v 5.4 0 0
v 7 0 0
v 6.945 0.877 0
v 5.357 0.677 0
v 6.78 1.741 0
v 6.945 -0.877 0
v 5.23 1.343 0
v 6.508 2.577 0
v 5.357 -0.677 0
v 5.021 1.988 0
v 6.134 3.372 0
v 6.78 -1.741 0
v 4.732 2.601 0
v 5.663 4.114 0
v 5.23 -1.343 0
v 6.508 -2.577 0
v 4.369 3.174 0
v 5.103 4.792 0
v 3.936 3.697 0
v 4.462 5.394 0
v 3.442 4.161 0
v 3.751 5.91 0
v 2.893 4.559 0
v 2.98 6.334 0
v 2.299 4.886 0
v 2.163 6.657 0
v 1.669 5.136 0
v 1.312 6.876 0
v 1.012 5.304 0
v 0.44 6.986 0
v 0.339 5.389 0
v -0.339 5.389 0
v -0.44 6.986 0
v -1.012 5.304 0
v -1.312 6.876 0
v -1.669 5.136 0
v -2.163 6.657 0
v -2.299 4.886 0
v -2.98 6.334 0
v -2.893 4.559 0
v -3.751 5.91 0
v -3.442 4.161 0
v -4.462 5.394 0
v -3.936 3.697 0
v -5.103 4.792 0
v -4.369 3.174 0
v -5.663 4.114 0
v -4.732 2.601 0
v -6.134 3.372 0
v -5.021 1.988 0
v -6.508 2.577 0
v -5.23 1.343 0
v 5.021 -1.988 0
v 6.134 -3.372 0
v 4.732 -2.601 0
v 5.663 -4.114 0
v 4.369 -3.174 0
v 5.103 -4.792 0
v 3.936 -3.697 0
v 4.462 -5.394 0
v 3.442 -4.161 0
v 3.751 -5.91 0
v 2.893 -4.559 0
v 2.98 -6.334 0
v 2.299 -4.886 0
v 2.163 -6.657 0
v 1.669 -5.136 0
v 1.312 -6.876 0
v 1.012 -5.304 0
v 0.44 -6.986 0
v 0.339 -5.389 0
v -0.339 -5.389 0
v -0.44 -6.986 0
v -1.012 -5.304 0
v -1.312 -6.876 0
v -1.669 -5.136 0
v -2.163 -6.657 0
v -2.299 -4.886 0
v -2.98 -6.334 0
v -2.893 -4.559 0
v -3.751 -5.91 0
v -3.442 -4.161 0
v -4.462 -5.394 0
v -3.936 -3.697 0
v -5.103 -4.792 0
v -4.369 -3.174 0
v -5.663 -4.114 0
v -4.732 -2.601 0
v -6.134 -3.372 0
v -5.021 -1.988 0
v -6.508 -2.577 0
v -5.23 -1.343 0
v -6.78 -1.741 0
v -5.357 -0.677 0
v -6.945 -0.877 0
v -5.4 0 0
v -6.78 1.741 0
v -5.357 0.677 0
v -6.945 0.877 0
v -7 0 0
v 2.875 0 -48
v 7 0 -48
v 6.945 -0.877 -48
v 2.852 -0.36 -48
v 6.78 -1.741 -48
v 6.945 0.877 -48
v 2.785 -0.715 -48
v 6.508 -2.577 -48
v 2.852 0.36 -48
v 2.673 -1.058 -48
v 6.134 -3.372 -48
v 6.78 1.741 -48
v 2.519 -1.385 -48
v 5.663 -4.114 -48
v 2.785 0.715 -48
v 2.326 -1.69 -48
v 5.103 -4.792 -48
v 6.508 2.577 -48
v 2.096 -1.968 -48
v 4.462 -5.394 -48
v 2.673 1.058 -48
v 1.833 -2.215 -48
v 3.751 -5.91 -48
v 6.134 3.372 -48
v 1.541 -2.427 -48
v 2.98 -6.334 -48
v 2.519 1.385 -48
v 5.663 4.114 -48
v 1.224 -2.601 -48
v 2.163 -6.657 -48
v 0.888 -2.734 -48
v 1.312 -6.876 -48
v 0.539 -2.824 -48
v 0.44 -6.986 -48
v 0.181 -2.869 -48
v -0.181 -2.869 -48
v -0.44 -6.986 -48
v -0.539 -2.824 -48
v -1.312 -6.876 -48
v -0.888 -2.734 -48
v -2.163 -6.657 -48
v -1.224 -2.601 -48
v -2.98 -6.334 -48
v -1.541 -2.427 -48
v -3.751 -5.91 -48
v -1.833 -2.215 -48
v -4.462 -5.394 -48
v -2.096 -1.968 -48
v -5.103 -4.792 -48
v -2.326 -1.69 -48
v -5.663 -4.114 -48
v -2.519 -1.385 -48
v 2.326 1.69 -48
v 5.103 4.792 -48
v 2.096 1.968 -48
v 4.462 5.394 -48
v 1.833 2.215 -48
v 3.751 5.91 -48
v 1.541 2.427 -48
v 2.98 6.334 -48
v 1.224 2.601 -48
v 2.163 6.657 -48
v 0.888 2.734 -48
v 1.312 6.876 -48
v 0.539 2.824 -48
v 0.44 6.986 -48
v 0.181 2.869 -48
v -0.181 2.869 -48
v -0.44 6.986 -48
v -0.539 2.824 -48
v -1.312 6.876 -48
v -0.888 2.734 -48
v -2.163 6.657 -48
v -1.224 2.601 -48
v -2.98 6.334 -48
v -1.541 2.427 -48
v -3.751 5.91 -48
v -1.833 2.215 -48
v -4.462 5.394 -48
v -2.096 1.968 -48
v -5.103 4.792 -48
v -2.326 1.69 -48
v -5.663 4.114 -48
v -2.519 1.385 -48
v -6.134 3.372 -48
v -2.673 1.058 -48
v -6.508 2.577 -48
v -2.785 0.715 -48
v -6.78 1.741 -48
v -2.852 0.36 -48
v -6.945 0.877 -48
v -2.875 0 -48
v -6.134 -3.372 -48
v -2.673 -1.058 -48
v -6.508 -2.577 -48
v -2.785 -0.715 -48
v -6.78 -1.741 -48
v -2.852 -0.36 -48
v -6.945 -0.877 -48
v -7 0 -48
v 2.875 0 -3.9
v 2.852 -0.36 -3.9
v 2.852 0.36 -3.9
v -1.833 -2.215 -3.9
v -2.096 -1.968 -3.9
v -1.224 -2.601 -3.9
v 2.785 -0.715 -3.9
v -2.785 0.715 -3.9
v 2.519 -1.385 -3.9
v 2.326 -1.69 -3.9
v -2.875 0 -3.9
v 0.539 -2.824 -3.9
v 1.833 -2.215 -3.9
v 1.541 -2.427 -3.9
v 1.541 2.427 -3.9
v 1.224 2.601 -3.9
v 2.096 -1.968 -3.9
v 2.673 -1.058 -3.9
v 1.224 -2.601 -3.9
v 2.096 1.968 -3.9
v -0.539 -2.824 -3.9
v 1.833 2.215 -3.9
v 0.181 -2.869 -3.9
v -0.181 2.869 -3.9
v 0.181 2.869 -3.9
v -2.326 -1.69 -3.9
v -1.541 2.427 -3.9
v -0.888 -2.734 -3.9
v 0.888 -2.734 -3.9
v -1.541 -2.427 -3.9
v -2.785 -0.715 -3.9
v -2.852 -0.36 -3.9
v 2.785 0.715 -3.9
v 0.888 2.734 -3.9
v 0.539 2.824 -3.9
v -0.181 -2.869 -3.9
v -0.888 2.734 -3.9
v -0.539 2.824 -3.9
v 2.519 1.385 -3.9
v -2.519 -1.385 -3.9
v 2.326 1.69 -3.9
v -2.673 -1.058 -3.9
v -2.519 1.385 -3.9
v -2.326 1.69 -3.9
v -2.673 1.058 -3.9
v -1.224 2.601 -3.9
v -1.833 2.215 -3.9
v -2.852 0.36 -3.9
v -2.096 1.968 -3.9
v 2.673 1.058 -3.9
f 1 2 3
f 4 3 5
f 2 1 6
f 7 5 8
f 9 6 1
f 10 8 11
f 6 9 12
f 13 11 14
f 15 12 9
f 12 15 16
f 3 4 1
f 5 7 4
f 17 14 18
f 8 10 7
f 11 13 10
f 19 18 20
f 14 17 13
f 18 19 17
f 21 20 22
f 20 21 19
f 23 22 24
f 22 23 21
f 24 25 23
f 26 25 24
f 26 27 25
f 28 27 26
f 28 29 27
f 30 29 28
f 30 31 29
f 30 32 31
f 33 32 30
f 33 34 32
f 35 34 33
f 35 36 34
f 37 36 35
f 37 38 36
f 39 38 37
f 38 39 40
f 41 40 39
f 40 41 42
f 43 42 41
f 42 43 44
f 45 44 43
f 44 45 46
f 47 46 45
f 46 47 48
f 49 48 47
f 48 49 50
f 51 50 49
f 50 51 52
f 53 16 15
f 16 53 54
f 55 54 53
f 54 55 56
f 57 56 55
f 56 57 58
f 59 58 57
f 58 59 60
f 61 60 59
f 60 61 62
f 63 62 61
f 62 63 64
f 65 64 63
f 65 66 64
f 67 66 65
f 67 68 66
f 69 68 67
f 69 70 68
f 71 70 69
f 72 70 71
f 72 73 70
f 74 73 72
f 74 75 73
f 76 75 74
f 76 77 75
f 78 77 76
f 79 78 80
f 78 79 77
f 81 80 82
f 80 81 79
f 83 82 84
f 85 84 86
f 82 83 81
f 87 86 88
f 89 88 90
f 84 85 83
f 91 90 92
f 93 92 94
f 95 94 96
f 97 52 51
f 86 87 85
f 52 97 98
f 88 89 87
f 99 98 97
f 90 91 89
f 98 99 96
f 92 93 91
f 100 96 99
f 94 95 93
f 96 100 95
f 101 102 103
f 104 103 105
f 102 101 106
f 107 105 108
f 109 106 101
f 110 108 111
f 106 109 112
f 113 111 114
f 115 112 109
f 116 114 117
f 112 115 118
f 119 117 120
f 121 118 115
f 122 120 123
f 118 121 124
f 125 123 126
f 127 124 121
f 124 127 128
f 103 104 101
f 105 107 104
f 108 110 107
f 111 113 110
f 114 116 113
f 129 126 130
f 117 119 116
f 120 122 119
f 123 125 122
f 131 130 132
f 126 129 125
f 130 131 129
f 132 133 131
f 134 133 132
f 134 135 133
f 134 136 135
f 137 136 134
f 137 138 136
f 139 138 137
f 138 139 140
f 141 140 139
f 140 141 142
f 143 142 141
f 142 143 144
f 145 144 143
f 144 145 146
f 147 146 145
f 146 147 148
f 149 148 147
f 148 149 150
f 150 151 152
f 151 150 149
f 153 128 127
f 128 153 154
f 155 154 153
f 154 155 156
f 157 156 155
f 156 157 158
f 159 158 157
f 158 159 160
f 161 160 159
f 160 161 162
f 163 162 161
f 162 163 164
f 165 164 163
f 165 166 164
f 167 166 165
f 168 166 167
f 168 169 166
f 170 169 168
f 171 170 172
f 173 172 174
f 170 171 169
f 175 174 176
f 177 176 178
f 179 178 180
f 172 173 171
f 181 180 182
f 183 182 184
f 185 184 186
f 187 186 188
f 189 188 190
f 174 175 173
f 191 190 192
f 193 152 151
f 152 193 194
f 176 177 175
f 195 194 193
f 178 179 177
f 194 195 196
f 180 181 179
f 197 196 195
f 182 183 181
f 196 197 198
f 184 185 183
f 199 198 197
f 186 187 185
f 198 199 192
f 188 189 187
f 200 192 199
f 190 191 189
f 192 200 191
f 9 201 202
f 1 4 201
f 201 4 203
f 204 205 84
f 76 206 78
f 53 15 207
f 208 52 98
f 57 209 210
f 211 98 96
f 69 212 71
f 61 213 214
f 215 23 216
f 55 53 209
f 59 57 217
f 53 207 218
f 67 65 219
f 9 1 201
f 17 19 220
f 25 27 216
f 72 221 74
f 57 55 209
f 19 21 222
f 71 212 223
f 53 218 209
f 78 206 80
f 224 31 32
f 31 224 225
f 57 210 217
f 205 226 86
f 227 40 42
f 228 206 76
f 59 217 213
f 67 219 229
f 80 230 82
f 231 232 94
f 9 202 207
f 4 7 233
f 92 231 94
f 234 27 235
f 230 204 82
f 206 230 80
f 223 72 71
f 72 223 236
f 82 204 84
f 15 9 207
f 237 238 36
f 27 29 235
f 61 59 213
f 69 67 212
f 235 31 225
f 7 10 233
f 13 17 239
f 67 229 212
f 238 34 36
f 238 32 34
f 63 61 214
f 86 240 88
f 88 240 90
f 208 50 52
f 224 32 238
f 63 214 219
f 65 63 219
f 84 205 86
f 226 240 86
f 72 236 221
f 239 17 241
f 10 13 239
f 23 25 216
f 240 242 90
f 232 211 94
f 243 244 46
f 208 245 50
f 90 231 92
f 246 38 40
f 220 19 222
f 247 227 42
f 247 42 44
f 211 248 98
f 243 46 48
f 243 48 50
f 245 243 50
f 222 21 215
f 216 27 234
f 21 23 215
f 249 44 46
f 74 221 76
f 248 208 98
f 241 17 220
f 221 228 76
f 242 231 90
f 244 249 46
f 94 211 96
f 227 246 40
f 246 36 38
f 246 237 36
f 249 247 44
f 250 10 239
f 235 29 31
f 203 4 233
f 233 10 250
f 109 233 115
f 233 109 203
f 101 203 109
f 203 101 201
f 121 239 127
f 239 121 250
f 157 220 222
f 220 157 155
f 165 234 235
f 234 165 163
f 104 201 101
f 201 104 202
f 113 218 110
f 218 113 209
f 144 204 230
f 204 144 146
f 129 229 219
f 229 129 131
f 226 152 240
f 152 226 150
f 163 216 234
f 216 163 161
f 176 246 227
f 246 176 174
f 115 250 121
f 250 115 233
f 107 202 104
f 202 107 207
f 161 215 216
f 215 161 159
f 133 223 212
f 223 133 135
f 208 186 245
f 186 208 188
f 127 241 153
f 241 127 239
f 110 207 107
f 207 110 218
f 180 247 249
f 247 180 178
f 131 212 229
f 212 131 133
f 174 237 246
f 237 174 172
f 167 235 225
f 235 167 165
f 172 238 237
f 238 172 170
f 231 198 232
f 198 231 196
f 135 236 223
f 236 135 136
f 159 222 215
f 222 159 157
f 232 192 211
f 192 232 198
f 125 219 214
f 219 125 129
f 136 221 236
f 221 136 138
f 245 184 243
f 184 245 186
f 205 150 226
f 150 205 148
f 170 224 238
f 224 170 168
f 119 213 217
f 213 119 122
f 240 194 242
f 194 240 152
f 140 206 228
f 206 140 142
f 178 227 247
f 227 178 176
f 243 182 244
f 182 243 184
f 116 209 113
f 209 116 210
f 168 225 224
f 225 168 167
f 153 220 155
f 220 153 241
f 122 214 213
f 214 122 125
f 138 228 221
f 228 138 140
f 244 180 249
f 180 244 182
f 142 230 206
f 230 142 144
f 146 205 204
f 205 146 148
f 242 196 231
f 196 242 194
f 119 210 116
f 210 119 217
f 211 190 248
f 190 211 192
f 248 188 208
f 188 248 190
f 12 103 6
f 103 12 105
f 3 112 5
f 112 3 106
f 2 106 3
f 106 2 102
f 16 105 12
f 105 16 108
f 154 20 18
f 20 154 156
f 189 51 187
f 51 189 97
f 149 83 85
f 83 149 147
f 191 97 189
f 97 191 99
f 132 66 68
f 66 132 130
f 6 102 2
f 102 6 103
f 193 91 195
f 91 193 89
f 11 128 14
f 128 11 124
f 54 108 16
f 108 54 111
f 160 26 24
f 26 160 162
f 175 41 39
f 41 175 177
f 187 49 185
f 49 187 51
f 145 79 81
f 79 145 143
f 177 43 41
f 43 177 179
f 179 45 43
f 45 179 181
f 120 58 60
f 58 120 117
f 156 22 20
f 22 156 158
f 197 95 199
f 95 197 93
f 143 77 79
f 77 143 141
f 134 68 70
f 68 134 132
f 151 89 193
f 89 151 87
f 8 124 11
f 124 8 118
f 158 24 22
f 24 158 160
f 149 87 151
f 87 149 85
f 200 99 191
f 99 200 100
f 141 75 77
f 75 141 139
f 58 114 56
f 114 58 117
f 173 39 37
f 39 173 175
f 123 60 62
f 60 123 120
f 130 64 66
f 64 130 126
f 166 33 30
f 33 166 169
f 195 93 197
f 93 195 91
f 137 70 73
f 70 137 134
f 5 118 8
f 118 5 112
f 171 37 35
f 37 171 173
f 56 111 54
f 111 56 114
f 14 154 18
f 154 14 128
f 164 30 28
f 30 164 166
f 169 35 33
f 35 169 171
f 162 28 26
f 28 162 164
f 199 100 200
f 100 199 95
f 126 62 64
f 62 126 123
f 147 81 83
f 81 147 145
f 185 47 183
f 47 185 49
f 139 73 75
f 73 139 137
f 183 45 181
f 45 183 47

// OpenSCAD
$fn = 50;


difference() {
	union() {
		translate(v = [0, 0, -48.0000000000]) {
			cylinder(h = 48, r = 7.0000000000);
		}
		cylinder(h = 0, r = 17.0000000000);
	}
	union() {
		translate(v = [0, 0, 0]) {
			rotate(a = [0, 0, 0]) {
				difference() {
					union() {
						#translate(v = [0, 0, -48.0000000000]) {
							cylinder(h = 48, r = 2.6000000000);
						}
						#translate(v = [0, 0, -3.9000000000]) {
							cylinder(h = 3.9000000000, r = 7.0000000000, r1 = 2.8750000000, r2 = 5.4000000000);
						}
						#translate(v = [0, 0, -48.0000000000]) {
							cylinder(h = 48, r = 2.8750000000);
						}
						#translate(v = [0, 0, -48.0000000000]) {
							cylinder(h = 48, r = 2.6000000000);
						}
					}
					union();
				}
			}
		}
	}
}
